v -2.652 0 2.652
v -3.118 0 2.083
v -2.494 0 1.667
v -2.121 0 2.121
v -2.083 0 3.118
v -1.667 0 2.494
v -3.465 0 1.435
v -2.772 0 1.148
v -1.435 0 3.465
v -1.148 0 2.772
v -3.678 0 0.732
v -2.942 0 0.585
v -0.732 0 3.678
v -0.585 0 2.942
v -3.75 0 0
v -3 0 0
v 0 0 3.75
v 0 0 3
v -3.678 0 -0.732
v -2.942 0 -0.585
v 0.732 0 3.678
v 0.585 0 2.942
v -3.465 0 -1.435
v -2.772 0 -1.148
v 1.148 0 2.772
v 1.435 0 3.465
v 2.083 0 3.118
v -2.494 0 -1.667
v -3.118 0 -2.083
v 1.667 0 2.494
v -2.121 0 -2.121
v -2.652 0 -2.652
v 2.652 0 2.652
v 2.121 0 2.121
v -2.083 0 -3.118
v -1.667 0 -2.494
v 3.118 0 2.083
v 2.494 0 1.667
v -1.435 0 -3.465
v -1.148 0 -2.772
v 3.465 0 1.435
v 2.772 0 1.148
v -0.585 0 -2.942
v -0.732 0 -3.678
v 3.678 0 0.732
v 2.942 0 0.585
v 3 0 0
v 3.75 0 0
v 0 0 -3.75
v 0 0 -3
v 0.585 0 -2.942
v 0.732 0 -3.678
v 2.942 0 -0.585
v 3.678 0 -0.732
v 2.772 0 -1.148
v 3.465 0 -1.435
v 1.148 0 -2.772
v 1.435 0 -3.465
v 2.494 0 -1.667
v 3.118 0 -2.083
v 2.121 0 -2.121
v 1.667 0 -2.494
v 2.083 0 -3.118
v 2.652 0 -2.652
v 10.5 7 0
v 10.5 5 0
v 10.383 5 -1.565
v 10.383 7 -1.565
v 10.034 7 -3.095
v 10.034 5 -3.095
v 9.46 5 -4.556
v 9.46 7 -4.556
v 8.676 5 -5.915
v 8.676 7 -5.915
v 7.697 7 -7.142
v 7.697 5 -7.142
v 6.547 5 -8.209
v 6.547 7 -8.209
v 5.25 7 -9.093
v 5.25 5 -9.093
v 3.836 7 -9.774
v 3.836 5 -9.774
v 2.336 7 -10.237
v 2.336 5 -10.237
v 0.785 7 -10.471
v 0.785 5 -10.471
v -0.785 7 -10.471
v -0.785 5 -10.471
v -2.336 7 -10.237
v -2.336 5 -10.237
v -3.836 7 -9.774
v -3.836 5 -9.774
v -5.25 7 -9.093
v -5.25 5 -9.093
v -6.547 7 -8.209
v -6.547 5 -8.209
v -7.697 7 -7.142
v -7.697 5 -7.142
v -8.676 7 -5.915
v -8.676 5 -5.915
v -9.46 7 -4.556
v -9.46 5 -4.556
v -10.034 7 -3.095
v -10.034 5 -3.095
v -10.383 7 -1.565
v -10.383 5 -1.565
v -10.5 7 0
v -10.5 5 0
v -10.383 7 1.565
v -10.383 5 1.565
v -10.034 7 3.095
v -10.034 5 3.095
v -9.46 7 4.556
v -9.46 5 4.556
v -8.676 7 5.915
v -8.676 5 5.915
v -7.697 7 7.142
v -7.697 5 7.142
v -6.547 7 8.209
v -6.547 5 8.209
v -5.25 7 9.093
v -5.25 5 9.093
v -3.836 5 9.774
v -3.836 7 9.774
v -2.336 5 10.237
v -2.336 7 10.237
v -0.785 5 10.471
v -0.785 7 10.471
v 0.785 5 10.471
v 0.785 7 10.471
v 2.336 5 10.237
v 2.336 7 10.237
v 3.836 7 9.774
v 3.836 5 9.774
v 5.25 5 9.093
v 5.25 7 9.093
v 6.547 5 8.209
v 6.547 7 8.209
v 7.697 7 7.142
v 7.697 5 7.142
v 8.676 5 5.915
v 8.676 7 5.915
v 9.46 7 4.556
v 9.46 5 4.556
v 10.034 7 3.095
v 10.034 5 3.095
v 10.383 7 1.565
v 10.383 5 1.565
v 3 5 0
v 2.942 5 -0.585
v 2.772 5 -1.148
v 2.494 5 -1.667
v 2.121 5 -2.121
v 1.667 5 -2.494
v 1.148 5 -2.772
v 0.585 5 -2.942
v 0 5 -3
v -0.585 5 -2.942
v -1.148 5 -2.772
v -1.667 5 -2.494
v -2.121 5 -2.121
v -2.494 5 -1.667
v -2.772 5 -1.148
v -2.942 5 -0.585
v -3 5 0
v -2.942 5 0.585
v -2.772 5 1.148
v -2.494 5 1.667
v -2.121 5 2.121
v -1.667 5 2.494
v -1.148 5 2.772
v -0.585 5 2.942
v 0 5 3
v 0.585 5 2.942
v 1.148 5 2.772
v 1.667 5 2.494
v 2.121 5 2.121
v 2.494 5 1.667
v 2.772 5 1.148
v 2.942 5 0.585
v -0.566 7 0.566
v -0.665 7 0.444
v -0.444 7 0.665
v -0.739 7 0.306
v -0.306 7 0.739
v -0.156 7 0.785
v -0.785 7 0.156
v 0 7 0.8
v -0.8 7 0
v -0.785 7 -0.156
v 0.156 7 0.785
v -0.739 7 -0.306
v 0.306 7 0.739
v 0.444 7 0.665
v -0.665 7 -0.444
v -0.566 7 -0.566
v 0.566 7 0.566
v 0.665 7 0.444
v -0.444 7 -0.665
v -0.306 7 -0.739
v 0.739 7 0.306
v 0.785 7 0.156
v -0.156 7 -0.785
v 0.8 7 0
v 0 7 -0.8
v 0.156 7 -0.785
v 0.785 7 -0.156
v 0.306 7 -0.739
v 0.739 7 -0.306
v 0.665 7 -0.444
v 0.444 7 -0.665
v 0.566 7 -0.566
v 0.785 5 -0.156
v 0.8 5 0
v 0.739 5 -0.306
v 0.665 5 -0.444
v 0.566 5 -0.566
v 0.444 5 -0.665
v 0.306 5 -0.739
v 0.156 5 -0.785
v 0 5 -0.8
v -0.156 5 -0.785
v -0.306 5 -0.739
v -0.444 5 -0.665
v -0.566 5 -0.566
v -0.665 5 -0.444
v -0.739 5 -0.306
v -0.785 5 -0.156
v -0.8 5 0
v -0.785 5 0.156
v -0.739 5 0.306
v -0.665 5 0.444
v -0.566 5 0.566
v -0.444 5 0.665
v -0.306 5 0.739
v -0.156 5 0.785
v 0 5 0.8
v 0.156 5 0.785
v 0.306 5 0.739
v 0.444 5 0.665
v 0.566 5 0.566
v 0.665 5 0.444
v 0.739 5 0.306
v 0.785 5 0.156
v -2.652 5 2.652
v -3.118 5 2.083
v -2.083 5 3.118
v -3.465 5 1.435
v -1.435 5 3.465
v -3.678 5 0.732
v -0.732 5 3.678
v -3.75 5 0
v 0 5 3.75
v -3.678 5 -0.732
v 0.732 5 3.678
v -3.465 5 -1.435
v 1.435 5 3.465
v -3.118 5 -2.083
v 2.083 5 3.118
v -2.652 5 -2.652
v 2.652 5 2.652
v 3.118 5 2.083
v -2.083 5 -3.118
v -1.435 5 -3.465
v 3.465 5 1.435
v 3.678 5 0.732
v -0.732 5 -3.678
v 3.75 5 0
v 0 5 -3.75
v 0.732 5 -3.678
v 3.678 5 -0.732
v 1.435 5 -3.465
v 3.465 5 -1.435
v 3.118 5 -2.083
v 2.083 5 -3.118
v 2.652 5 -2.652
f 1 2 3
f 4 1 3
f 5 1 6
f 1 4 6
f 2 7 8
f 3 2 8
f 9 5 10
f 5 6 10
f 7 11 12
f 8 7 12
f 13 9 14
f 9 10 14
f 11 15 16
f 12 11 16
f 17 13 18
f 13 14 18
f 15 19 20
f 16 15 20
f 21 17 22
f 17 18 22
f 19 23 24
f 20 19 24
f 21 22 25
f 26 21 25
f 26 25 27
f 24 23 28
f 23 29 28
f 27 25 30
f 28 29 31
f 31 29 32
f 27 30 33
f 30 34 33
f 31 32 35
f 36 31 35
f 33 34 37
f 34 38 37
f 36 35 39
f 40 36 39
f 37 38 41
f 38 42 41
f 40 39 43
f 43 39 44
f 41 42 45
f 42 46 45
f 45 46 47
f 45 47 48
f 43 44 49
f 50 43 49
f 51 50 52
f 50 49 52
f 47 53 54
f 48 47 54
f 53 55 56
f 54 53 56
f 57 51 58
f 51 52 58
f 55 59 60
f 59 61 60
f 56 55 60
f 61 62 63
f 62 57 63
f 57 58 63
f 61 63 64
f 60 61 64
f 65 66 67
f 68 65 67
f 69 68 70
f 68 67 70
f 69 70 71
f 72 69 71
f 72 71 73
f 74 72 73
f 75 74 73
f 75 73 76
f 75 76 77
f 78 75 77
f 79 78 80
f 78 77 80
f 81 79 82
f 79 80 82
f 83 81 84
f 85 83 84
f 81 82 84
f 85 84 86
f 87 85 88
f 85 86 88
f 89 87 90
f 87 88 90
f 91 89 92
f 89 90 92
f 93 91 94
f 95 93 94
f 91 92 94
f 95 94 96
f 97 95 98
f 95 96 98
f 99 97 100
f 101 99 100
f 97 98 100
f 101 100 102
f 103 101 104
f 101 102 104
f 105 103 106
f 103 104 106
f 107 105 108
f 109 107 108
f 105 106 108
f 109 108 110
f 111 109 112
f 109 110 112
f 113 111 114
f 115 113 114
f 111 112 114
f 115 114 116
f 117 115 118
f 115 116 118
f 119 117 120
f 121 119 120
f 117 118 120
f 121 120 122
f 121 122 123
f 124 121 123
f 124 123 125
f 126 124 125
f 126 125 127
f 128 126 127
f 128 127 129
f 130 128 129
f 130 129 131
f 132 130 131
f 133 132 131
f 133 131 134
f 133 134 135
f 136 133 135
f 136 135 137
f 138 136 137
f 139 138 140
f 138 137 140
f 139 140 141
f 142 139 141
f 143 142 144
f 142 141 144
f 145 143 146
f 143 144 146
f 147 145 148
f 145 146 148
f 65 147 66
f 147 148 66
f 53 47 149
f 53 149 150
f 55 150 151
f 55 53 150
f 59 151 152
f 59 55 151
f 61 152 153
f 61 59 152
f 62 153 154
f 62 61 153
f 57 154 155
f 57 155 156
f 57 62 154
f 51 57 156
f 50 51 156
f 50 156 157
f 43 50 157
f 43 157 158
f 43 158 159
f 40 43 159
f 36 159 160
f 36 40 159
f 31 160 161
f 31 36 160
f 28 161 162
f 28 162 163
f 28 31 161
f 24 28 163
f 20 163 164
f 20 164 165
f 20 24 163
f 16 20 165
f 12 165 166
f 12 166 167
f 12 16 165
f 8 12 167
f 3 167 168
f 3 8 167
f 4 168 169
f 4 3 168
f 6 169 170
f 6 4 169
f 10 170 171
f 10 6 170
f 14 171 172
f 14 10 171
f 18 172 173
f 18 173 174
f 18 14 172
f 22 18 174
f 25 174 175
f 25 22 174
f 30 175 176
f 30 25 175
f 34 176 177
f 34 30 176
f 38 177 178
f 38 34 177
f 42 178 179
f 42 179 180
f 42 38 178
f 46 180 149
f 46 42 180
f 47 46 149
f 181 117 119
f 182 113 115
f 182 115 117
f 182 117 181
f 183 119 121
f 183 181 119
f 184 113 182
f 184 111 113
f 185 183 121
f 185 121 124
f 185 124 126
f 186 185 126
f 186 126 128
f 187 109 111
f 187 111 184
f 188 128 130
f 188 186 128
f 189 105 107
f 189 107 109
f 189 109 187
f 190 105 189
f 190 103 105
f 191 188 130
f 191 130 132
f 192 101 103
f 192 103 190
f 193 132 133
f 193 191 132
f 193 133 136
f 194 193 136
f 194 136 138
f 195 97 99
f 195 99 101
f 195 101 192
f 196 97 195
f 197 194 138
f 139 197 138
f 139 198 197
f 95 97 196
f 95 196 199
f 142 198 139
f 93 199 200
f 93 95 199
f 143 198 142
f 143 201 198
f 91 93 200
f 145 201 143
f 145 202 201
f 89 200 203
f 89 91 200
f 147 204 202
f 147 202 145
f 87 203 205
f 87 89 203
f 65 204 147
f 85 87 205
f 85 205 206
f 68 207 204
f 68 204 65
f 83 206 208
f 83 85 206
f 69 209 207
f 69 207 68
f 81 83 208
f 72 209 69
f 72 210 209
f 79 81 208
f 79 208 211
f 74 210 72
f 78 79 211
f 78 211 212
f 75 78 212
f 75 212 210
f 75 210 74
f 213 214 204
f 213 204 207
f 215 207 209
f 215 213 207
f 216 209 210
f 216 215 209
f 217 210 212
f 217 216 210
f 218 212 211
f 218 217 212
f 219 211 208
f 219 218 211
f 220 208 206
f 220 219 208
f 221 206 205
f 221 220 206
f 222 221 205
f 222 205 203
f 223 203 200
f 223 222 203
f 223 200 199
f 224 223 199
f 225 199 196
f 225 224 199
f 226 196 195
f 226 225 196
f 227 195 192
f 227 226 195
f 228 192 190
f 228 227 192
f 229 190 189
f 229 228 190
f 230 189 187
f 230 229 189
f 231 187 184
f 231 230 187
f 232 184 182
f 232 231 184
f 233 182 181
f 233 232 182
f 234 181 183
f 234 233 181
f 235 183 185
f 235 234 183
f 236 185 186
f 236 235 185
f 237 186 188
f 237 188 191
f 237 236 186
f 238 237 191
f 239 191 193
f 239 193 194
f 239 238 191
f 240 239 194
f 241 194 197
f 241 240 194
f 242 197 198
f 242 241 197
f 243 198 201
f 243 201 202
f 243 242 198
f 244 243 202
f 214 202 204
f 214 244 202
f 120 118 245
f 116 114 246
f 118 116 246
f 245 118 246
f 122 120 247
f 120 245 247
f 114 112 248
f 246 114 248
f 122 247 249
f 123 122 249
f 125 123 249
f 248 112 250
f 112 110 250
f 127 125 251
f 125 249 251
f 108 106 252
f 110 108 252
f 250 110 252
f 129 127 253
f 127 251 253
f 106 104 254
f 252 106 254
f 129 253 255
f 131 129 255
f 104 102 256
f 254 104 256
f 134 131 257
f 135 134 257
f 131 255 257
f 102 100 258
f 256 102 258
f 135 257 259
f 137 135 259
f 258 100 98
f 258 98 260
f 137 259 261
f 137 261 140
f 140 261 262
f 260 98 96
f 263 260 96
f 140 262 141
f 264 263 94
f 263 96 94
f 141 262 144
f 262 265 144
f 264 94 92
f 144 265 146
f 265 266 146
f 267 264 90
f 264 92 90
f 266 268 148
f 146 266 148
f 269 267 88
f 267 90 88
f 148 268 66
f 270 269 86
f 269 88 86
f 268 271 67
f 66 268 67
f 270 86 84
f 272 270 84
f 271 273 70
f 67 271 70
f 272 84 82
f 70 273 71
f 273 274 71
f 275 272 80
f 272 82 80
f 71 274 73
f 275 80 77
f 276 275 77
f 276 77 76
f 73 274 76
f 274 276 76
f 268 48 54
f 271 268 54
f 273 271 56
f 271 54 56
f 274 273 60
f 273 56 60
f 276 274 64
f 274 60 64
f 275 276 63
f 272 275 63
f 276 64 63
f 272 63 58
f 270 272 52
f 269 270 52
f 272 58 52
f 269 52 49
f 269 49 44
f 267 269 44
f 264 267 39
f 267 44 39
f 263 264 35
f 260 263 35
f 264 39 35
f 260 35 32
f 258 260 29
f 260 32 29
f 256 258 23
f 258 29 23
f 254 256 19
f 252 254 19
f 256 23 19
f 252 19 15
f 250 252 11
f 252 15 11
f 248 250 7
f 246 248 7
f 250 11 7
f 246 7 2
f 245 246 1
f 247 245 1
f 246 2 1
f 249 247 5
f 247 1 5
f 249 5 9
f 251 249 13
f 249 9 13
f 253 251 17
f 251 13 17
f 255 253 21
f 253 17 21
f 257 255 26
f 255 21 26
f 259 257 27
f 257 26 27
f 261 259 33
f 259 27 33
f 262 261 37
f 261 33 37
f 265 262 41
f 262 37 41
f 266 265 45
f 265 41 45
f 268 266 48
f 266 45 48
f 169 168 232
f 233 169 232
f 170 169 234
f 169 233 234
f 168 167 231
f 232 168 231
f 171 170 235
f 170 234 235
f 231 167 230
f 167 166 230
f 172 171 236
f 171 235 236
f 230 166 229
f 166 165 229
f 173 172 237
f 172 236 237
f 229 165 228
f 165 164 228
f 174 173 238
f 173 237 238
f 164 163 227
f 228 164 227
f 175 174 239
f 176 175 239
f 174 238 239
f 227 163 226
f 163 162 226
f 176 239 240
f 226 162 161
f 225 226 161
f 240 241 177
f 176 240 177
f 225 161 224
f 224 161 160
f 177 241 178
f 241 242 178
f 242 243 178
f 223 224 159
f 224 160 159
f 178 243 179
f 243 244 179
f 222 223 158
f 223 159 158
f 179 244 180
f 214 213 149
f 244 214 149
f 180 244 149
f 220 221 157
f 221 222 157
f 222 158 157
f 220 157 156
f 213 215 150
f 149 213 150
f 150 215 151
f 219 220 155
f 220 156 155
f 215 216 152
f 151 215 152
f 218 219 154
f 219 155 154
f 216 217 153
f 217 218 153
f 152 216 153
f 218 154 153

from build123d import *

# Parameters (mm, degrees)
CROQUIS1_R              = 3.75
CROQUIS1_R_2            = 3
SALIENTE_EXTRUIR1_DEPTH = 5
CROQUIS2_R              = 10.5
CROQUIS2_R_2            = 0.8
SALIENTE_EXTRUIR2_DEPTH = 2


with BuildPart() as part:
    # Croquis1 → Saliente-Extruir1 (new body)
    with BuildSketch(Plane(origin=(0, 0, 0), x_dir=(1, 0, 0), z_dir=(0, 1, 0))):
        Circle(CROQUIS1_R)
        Circle(CROQUIS1_R_2, mode=Mode.SUBTRACT)
    extrude(amount=SALIENTE_EXTRUIR1_DEPTH)

    # Croquis2 → Saliente-Extruir2 (add)
    with BuildSketch(Plane(origin=(0, 5, 0), x_dir=(1, 0, 0), z_dir=(0, 1, 0))):
        Circle(CROQUIS2_R)
        Circle(CROQUIS2_R_2, mode=Mode.SUBTRACT)
    extrude(amount=SALIENTE_EXTRUIR2_DEPTH)


solid = part.part
